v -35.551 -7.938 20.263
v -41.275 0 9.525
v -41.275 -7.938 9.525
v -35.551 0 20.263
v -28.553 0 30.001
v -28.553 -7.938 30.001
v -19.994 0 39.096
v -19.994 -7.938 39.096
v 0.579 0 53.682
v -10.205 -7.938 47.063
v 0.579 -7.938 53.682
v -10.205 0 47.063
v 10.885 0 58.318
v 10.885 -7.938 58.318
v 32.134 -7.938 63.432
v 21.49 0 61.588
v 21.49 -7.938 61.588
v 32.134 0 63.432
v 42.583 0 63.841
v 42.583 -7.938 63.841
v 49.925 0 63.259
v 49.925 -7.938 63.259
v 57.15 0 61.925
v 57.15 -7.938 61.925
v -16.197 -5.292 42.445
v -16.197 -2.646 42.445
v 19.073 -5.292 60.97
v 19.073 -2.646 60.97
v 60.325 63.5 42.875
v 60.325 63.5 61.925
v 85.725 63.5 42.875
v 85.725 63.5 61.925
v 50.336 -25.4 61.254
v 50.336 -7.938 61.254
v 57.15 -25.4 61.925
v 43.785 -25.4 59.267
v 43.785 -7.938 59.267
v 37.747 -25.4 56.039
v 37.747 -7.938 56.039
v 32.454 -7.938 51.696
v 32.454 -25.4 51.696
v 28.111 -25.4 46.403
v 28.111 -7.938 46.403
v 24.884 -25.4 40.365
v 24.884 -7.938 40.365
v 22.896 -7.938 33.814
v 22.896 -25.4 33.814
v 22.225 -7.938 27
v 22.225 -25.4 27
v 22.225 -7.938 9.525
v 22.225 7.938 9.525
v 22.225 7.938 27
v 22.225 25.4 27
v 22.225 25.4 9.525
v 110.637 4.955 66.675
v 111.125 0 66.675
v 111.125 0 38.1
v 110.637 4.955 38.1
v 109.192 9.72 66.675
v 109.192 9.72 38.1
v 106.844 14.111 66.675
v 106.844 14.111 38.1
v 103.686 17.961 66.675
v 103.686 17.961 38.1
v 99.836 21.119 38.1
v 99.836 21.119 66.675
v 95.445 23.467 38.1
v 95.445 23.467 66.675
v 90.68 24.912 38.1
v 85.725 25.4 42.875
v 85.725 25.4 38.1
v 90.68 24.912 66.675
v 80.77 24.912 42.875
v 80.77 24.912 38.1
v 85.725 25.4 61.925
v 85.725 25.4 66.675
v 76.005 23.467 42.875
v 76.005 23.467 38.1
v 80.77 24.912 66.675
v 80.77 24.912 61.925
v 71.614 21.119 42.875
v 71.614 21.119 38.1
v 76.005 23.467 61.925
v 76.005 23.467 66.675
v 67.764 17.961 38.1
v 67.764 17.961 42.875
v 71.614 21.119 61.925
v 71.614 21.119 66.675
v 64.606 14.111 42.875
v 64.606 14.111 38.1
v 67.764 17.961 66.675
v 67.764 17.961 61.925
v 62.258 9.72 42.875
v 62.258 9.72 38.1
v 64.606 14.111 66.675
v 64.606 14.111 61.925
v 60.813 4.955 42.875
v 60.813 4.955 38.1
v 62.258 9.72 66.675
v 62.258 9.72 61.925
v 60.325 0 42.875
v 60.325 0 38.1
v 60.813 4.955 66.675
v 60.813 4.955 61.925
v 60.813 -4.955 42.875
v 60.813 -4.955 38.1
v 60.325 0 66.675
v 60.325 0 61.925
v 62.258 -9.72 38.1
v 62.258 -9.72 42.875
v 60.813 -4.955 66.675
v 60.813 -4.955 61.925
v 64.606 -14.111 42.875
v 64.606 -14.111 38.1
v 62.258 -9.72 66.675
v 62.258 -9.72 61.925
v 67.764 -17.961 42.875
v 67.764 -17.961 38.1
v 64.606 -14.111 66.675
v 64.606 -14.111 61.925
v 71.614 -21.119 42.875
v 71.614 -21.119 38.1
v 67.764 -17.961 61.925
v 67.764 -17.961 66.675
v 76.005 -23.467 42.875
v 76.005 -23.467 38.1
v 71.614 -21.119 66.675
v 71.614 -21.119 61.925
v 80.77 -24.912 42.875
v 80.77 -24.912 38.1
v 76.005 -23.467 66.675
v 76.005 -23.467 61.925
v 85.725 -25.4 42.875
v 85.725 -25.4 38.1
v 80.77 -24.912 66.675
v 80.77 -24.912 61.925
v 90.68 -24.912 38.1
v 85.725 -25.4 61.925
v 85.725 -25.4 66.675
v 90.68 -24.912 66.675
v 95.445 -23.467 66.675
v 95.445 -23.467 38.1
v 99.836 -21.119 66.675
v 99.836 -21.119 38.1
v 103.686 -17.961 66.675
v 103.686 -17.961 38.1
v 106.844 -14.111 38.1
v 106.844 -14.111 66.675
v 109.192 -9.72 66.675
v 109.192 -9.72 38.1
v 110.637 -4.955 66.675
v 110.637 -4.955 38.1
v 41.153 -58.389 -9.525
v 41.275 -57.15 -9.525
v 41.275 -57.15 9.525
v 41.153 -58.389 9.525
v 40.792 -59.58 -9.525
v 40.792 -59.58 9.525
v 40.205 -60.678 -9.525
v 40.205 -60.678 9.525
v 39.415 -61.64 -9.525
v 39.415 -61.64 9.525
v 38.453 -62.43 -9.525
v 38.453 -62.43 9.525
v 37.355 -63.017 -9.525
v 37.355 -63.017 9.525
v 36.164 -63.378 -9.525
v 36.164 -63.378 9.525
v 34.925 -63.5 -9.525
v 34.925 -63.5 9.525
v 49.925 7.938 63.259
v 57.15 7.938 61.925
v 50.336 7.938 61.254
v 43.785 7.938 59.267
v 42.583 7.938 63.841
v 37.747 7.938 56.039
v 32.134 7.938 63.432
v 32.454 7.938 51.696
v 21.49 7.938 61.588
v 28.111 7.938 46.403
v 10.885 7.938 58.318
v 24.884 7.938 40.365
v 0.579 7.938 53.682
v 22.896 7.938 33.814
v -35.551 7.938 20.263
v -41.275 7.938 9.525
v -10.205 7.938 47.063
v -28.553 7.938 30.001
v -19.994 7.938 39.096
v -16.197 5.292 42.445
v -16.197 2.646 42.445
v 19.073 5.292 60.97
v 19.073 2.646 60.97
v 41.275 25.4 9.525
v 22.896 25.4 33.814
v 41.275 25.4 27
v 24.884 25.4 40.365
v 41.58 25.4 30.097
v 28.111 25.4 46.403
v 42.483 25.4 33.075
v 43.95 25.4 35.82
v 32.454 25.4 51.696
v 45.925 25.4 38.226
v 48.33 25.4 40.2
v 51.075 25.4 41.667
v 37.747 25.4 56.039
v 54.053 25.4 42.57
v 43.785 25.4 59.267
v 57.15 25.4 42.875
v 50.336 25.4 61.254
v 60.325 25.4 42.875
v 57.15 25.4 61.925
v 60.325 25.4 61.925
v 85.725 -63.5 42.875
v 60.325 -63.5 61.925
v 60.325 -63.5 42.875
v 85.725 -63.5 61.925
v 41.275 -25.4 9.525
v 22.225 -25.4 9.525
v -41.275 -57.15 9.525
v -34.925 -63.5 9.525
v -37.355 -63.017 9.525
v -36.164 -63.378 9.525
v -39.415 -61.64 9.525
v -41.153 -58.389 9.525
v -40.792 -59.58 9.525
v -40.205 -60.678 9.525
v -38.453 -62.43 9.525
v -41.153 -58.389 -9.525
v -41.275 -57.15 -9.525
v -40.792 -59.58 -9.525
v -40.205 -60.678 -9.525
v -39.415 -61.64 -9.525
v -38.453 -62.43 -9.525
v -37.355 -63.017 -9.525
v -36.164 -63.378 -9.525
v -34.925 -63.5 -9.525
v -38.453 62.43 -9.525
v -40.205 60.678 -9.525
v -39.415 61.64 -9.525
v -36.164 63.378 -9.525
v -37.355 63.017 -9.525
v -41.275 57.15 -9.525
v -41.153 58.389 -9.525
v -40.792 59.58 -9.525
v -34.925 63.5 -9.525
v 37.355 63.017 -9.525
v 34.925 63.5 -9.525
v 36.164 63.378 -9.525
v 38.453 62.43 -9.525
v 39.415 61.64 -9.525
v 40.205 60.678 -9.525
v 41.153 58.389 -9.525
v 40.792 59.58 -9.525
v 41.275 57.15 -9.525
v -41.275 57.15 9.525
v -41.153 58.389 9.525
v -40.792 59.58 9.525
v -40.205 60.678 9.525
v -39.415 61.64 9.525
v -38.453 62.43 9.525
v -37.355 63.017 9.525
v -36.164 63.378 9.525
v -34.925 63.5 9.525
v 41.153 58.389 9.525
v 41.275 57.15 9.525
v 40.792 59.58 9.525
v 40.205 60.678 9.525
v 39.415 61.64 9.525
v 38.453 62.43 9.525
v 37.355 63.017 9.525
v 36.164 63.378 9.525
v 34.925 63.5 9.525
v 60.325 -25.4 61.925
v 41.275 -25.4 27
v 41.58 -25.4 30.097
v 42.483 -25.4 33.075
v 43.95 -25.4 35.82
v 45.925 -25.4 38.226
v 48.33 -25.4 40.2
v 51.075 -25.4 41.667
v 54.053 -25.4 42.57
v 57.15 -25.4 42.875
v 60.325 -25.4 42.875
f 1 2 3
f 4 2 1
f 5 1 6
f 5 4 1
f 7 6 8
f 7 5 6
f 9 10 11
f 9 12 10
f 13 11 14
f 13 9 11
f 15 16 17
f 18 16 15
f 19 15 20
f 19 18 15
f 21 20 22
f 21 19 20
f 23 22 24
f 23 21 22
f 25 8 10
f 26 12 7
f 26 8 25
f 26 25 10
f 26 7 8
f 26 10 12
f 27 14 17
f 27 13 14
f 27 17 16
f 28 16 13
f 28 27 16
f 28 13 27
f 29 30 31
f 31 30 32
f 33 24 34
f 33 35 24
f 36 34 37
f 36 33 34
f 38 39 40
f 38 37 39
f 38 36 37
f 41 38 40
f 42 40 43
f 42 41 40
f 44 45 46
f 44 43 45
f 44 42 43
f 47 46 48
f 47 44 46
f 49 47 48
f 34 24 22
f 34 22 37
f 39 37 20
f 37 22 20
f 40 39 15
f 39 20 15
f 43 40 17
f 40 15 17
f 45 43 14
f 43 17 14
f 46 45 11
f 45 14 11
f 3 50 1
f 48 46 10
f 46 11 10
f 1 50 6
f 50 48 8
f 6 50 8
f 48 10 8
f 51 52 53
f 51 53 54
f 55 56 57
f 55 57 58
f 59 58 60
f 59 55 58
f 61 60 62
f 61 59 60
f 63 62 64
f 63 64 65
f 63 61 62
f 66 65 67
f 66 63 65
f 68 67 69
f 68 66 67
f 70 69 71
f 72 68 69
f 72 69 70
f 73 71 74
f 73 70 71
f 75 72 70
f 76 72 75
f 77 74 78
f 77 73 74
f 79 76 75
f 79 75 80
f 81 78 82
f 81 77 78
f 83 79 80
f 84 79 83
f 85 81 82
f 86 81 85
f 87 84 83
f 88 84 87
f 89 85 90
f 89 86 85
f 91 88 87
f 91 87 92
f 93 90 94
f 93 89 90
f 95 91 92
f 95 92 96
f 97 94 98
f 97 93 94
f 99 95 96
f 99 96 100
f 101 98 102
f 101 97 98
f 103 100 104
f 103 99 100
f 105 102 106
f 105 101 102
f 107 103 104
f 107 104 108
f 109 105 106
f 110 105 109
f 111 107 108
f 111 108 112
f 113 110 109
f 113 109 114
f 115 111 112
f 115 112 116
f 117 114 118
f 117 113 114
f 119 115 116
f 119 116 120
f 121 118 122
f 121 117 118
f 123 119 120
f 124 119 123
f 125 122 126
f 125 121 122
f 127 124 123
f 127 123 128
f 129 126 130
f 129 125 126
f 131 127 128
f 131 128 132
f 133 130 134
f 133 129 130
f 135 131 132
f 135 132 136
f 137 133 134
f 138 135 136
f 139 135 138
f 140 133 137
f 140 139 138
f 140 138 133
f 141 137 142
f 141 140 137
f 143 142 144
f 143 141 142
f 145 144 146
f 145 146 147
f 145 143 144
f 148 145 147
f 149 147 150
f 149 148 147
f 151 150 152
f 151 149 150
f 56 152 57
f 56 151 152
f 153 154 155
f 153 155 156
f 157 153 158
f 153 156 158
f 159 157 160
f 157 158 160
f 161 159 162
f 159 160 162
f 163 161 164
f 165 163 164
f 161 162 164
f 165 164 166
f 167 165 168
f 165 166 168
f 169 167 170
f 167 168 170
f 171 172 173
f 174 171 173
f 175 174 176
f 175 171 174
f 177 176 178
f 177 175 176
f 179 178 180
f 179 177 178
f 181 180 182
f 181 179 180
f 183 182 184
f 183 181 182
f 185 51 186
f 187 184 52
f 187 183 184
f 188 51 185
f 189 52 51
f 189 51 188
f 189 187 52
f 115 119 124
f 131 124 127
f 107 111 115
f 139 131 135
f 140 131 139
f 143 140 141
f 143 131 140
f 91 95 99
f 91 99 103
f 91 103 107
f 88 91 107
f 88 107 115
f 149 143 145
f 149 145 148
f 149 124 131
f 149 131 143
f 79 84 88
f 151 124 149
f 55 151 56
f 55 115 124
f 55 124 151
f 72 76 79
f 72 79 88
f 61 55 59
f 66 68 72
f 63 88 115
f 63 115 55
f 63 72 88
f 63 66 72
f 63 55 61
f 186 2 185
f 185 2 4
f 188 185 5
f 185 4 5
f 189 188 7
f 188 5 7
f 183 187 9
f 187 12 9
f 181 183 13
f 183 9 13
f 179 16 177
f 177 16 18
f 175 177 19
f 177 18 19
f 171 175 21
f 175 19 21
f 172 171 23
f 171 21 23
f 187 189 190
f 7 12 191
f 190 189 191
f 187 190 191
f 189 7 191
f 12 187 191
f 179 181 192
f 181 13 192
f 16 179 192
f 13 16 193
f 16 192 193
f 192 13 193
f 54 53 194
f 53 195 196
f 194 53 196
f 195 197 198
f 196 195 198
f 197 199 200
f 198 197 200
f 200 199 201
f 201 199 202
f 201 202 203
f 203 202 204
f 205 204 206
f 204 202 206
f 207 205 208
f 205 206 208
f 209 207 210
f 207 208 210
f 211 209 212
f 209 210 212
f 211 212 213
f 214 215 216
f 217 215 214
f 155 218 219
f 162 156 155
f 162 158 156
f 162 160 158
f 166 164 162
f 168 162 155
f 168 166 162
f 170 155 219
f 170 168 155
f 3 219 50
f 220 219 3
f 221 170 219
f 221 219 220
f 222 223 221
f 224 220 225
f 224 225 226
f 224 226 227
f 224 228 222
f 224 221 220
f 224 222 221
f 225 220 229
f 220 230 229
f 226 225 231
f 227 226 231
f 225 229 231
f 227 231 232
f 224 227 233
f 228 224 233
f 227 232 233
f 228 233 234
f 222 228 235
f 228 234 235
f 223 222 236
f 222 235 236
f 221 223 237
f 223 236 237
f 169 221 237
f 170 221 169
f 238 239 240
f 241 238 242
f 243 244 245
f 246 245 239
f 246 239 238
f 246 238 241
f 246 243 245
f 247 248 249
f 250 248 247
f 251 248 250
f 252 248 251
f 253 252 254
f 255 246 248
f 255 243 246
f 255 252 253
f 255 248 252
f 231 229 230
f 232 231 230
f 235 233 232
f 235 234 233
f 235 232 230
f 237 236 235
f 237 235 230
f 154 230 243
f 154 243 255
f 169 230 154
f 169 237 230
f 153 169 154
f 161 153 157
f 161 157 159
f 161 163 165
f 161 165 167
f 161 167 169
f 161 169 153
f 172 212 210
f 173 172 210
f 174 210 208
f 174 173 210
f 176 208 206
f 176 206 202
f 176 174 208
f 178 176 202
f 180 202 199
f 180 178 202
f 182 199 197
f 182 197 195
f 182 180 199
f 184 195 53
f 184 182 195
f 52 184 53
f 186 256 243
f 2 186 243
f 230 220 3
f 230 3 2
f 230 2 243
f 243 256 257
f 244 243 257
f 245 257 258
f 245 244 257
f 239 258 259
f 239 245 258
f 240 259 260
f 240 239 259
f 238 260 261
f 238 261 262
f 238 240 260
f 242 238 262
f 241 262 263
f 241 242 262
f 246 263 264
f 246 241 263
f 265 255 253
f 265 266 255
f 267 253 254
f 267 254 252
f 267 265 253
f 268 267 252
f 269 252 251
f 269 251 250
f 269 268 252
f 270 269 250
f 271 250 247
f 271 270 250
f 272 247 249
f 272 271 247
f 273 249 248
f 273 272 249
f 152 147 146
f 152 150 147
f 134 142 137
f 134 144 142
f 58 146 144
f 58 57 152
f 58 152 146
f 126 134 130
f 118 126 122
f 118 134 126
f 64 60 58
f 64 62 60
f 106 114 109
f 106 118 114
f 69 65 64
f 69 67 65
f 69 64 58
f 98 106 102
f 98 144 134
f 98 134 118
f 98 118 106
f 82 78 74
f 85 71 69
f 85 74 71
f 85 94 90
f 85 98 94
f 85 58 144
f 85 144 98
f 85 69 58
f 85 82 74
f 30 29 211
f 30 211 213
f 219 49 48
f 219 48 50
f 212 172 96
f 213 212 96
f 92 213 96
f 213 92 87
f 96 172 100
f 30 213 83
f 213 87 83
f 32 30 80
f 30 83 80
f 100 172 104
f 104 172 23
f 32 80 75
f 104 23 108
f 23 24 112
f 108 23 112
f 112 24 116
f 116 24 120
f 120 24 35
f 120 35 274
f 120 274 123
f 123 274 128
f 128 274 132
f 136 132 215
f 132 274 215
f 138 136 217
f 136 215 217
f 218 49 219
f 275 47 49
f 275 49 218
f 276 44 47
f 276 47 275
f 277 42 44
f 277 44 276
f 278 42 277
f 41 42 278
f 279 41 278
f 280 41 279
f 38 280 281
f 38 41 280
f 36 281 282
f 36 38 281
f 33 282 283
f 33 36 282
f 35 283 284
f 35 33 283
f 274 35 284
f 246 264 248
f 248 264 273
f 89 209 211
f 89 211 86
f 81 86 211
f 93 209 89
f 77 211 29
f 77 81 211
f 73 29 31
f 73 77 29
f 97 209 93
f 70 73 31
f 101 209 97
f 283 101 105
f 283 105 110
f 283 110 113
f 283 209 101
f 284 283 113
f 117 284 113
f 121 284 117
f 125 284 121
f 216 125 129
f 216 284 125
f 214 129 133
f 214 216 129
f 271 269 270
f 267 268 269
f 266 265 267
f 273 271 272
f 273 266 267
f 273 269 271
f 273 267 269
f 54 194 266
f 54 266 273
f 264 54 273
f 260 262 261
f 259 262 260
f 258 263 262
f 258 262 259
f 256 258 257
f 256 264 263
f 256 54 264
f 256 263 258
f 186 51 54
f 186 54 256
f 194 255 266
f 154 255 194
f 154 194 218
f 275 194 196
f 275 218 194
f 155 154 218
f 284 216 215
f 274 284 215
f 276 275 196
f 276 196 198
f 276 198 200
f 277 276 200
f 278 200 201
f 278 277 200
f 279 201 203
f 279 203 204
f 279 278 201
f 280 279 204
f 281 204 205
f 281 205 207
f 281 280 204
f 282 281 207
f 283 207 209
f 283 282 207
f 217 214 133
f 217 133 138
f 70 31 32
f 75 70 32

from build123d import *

# Parameters (mm, degrees)
F1_DEPTH = 63.5
F2_DEPTH = 25.4
F3_DEPTH = 7.9375
F0_W     = 25.4
F0_H     = 19.05
F4_DEPTH = 63.5
F6_R     = 6.35


with BuildPart() as f1:
    # F0 (on Front) → F1 (new body, symmetric)
    with BuildSketch(Plane.XZ):
        Polygon((-41.275, 9.525), (-41.275, -9.525), (41.275, -9.525), (41.275, 9.525), (22.225, 9.525), align=None)
    extrude(amount=F1_DEPTH, both=True)

    # F0 (on Front) → F2 (join, symmetric)
    with BuildSketch(Plane.XZ):
        with BuildLine():
            Line((22.225, 9.525), (41.275, 9.525))
            Line((41.275, 9.525), (41.275, 27.0002))
            ThreePointArc((41.275, 27.0002), (45.9246798487, 38.2255201513), (57.15, 42.8752))
            Line((57.15, 42.8752), (60.325, 42.8752))
            Line((60.325, 42.8752), (60.325, 61.9252))
            Line((60.325, 61.9252), (57.15, 61.9252))
            ThreePointArc((57.15, 61.9252), (32.4542956671, 51.6959043329), (22.225, 27.0002))
            Line((22.225, 27.0002), (22.225, 9.525))
        make_face()
    extrude(amount=F2_DEPTH, both=True)

    # F0 (on Front) → F3 (join, symmetric)
    with BuildSketch(Plane.XZ):
        with BuildLine():
            add(Edge.make_bspline(
                [(-41.275, 9.525), (-23.7557739019, 48.5848635435), (20.1313588768, 70.8134099841), (57.15, 61.9252)],
                knots=[0, 0, 0, 0, 111.5045361635, 111.5045361635, 111.5045361635, 111.5045361635], degree=3))
            Line((-41.275, 9.525), (22.225, 9.525))
            Line((22.225, 9.525), (22.225, 27.0002))
            ThreePointArc((22.225, 27.0002), (32.4542956671, 51.6959043329), (57.15, 61.9252))
        make_face()
    extrude(amount=F3_DEPTH, both=True)

    # F0 (on Front) → F4 (join, symmetric)
    with BuildSketch(Plane.XZ):
        with Locations((73.025, 52.4002)):
            Rectangle(F0_W, F0_H)
    extrude(amount=F4_DEPTH, both=True)

    # F0 (on Front) → F5 (revolve)
    with BuildSketch(Plane.XZ):
        Polygon((85.725, 66.675), (85.725, 61.9252), (85.725, 42.8752), (85.725, 38.1), (111.125, 38.1), (111.125, 66.675), align=None)
    revolve(axis=Axis((85.725, 0, 52.3875), (0, 0, 1)))

    # F6
    f6_edges = [f1.edges().sort_by_distance(p)[0] for p in [
        (-41.275, -63.5, 0),
        (41.275, -63.5, 0),
        (41.275, 63.5, 0),
        (-41.275, 63.5, 0),
    ]]
    fillet(f6_edges, radius=F6_R)


solid = f1.part
